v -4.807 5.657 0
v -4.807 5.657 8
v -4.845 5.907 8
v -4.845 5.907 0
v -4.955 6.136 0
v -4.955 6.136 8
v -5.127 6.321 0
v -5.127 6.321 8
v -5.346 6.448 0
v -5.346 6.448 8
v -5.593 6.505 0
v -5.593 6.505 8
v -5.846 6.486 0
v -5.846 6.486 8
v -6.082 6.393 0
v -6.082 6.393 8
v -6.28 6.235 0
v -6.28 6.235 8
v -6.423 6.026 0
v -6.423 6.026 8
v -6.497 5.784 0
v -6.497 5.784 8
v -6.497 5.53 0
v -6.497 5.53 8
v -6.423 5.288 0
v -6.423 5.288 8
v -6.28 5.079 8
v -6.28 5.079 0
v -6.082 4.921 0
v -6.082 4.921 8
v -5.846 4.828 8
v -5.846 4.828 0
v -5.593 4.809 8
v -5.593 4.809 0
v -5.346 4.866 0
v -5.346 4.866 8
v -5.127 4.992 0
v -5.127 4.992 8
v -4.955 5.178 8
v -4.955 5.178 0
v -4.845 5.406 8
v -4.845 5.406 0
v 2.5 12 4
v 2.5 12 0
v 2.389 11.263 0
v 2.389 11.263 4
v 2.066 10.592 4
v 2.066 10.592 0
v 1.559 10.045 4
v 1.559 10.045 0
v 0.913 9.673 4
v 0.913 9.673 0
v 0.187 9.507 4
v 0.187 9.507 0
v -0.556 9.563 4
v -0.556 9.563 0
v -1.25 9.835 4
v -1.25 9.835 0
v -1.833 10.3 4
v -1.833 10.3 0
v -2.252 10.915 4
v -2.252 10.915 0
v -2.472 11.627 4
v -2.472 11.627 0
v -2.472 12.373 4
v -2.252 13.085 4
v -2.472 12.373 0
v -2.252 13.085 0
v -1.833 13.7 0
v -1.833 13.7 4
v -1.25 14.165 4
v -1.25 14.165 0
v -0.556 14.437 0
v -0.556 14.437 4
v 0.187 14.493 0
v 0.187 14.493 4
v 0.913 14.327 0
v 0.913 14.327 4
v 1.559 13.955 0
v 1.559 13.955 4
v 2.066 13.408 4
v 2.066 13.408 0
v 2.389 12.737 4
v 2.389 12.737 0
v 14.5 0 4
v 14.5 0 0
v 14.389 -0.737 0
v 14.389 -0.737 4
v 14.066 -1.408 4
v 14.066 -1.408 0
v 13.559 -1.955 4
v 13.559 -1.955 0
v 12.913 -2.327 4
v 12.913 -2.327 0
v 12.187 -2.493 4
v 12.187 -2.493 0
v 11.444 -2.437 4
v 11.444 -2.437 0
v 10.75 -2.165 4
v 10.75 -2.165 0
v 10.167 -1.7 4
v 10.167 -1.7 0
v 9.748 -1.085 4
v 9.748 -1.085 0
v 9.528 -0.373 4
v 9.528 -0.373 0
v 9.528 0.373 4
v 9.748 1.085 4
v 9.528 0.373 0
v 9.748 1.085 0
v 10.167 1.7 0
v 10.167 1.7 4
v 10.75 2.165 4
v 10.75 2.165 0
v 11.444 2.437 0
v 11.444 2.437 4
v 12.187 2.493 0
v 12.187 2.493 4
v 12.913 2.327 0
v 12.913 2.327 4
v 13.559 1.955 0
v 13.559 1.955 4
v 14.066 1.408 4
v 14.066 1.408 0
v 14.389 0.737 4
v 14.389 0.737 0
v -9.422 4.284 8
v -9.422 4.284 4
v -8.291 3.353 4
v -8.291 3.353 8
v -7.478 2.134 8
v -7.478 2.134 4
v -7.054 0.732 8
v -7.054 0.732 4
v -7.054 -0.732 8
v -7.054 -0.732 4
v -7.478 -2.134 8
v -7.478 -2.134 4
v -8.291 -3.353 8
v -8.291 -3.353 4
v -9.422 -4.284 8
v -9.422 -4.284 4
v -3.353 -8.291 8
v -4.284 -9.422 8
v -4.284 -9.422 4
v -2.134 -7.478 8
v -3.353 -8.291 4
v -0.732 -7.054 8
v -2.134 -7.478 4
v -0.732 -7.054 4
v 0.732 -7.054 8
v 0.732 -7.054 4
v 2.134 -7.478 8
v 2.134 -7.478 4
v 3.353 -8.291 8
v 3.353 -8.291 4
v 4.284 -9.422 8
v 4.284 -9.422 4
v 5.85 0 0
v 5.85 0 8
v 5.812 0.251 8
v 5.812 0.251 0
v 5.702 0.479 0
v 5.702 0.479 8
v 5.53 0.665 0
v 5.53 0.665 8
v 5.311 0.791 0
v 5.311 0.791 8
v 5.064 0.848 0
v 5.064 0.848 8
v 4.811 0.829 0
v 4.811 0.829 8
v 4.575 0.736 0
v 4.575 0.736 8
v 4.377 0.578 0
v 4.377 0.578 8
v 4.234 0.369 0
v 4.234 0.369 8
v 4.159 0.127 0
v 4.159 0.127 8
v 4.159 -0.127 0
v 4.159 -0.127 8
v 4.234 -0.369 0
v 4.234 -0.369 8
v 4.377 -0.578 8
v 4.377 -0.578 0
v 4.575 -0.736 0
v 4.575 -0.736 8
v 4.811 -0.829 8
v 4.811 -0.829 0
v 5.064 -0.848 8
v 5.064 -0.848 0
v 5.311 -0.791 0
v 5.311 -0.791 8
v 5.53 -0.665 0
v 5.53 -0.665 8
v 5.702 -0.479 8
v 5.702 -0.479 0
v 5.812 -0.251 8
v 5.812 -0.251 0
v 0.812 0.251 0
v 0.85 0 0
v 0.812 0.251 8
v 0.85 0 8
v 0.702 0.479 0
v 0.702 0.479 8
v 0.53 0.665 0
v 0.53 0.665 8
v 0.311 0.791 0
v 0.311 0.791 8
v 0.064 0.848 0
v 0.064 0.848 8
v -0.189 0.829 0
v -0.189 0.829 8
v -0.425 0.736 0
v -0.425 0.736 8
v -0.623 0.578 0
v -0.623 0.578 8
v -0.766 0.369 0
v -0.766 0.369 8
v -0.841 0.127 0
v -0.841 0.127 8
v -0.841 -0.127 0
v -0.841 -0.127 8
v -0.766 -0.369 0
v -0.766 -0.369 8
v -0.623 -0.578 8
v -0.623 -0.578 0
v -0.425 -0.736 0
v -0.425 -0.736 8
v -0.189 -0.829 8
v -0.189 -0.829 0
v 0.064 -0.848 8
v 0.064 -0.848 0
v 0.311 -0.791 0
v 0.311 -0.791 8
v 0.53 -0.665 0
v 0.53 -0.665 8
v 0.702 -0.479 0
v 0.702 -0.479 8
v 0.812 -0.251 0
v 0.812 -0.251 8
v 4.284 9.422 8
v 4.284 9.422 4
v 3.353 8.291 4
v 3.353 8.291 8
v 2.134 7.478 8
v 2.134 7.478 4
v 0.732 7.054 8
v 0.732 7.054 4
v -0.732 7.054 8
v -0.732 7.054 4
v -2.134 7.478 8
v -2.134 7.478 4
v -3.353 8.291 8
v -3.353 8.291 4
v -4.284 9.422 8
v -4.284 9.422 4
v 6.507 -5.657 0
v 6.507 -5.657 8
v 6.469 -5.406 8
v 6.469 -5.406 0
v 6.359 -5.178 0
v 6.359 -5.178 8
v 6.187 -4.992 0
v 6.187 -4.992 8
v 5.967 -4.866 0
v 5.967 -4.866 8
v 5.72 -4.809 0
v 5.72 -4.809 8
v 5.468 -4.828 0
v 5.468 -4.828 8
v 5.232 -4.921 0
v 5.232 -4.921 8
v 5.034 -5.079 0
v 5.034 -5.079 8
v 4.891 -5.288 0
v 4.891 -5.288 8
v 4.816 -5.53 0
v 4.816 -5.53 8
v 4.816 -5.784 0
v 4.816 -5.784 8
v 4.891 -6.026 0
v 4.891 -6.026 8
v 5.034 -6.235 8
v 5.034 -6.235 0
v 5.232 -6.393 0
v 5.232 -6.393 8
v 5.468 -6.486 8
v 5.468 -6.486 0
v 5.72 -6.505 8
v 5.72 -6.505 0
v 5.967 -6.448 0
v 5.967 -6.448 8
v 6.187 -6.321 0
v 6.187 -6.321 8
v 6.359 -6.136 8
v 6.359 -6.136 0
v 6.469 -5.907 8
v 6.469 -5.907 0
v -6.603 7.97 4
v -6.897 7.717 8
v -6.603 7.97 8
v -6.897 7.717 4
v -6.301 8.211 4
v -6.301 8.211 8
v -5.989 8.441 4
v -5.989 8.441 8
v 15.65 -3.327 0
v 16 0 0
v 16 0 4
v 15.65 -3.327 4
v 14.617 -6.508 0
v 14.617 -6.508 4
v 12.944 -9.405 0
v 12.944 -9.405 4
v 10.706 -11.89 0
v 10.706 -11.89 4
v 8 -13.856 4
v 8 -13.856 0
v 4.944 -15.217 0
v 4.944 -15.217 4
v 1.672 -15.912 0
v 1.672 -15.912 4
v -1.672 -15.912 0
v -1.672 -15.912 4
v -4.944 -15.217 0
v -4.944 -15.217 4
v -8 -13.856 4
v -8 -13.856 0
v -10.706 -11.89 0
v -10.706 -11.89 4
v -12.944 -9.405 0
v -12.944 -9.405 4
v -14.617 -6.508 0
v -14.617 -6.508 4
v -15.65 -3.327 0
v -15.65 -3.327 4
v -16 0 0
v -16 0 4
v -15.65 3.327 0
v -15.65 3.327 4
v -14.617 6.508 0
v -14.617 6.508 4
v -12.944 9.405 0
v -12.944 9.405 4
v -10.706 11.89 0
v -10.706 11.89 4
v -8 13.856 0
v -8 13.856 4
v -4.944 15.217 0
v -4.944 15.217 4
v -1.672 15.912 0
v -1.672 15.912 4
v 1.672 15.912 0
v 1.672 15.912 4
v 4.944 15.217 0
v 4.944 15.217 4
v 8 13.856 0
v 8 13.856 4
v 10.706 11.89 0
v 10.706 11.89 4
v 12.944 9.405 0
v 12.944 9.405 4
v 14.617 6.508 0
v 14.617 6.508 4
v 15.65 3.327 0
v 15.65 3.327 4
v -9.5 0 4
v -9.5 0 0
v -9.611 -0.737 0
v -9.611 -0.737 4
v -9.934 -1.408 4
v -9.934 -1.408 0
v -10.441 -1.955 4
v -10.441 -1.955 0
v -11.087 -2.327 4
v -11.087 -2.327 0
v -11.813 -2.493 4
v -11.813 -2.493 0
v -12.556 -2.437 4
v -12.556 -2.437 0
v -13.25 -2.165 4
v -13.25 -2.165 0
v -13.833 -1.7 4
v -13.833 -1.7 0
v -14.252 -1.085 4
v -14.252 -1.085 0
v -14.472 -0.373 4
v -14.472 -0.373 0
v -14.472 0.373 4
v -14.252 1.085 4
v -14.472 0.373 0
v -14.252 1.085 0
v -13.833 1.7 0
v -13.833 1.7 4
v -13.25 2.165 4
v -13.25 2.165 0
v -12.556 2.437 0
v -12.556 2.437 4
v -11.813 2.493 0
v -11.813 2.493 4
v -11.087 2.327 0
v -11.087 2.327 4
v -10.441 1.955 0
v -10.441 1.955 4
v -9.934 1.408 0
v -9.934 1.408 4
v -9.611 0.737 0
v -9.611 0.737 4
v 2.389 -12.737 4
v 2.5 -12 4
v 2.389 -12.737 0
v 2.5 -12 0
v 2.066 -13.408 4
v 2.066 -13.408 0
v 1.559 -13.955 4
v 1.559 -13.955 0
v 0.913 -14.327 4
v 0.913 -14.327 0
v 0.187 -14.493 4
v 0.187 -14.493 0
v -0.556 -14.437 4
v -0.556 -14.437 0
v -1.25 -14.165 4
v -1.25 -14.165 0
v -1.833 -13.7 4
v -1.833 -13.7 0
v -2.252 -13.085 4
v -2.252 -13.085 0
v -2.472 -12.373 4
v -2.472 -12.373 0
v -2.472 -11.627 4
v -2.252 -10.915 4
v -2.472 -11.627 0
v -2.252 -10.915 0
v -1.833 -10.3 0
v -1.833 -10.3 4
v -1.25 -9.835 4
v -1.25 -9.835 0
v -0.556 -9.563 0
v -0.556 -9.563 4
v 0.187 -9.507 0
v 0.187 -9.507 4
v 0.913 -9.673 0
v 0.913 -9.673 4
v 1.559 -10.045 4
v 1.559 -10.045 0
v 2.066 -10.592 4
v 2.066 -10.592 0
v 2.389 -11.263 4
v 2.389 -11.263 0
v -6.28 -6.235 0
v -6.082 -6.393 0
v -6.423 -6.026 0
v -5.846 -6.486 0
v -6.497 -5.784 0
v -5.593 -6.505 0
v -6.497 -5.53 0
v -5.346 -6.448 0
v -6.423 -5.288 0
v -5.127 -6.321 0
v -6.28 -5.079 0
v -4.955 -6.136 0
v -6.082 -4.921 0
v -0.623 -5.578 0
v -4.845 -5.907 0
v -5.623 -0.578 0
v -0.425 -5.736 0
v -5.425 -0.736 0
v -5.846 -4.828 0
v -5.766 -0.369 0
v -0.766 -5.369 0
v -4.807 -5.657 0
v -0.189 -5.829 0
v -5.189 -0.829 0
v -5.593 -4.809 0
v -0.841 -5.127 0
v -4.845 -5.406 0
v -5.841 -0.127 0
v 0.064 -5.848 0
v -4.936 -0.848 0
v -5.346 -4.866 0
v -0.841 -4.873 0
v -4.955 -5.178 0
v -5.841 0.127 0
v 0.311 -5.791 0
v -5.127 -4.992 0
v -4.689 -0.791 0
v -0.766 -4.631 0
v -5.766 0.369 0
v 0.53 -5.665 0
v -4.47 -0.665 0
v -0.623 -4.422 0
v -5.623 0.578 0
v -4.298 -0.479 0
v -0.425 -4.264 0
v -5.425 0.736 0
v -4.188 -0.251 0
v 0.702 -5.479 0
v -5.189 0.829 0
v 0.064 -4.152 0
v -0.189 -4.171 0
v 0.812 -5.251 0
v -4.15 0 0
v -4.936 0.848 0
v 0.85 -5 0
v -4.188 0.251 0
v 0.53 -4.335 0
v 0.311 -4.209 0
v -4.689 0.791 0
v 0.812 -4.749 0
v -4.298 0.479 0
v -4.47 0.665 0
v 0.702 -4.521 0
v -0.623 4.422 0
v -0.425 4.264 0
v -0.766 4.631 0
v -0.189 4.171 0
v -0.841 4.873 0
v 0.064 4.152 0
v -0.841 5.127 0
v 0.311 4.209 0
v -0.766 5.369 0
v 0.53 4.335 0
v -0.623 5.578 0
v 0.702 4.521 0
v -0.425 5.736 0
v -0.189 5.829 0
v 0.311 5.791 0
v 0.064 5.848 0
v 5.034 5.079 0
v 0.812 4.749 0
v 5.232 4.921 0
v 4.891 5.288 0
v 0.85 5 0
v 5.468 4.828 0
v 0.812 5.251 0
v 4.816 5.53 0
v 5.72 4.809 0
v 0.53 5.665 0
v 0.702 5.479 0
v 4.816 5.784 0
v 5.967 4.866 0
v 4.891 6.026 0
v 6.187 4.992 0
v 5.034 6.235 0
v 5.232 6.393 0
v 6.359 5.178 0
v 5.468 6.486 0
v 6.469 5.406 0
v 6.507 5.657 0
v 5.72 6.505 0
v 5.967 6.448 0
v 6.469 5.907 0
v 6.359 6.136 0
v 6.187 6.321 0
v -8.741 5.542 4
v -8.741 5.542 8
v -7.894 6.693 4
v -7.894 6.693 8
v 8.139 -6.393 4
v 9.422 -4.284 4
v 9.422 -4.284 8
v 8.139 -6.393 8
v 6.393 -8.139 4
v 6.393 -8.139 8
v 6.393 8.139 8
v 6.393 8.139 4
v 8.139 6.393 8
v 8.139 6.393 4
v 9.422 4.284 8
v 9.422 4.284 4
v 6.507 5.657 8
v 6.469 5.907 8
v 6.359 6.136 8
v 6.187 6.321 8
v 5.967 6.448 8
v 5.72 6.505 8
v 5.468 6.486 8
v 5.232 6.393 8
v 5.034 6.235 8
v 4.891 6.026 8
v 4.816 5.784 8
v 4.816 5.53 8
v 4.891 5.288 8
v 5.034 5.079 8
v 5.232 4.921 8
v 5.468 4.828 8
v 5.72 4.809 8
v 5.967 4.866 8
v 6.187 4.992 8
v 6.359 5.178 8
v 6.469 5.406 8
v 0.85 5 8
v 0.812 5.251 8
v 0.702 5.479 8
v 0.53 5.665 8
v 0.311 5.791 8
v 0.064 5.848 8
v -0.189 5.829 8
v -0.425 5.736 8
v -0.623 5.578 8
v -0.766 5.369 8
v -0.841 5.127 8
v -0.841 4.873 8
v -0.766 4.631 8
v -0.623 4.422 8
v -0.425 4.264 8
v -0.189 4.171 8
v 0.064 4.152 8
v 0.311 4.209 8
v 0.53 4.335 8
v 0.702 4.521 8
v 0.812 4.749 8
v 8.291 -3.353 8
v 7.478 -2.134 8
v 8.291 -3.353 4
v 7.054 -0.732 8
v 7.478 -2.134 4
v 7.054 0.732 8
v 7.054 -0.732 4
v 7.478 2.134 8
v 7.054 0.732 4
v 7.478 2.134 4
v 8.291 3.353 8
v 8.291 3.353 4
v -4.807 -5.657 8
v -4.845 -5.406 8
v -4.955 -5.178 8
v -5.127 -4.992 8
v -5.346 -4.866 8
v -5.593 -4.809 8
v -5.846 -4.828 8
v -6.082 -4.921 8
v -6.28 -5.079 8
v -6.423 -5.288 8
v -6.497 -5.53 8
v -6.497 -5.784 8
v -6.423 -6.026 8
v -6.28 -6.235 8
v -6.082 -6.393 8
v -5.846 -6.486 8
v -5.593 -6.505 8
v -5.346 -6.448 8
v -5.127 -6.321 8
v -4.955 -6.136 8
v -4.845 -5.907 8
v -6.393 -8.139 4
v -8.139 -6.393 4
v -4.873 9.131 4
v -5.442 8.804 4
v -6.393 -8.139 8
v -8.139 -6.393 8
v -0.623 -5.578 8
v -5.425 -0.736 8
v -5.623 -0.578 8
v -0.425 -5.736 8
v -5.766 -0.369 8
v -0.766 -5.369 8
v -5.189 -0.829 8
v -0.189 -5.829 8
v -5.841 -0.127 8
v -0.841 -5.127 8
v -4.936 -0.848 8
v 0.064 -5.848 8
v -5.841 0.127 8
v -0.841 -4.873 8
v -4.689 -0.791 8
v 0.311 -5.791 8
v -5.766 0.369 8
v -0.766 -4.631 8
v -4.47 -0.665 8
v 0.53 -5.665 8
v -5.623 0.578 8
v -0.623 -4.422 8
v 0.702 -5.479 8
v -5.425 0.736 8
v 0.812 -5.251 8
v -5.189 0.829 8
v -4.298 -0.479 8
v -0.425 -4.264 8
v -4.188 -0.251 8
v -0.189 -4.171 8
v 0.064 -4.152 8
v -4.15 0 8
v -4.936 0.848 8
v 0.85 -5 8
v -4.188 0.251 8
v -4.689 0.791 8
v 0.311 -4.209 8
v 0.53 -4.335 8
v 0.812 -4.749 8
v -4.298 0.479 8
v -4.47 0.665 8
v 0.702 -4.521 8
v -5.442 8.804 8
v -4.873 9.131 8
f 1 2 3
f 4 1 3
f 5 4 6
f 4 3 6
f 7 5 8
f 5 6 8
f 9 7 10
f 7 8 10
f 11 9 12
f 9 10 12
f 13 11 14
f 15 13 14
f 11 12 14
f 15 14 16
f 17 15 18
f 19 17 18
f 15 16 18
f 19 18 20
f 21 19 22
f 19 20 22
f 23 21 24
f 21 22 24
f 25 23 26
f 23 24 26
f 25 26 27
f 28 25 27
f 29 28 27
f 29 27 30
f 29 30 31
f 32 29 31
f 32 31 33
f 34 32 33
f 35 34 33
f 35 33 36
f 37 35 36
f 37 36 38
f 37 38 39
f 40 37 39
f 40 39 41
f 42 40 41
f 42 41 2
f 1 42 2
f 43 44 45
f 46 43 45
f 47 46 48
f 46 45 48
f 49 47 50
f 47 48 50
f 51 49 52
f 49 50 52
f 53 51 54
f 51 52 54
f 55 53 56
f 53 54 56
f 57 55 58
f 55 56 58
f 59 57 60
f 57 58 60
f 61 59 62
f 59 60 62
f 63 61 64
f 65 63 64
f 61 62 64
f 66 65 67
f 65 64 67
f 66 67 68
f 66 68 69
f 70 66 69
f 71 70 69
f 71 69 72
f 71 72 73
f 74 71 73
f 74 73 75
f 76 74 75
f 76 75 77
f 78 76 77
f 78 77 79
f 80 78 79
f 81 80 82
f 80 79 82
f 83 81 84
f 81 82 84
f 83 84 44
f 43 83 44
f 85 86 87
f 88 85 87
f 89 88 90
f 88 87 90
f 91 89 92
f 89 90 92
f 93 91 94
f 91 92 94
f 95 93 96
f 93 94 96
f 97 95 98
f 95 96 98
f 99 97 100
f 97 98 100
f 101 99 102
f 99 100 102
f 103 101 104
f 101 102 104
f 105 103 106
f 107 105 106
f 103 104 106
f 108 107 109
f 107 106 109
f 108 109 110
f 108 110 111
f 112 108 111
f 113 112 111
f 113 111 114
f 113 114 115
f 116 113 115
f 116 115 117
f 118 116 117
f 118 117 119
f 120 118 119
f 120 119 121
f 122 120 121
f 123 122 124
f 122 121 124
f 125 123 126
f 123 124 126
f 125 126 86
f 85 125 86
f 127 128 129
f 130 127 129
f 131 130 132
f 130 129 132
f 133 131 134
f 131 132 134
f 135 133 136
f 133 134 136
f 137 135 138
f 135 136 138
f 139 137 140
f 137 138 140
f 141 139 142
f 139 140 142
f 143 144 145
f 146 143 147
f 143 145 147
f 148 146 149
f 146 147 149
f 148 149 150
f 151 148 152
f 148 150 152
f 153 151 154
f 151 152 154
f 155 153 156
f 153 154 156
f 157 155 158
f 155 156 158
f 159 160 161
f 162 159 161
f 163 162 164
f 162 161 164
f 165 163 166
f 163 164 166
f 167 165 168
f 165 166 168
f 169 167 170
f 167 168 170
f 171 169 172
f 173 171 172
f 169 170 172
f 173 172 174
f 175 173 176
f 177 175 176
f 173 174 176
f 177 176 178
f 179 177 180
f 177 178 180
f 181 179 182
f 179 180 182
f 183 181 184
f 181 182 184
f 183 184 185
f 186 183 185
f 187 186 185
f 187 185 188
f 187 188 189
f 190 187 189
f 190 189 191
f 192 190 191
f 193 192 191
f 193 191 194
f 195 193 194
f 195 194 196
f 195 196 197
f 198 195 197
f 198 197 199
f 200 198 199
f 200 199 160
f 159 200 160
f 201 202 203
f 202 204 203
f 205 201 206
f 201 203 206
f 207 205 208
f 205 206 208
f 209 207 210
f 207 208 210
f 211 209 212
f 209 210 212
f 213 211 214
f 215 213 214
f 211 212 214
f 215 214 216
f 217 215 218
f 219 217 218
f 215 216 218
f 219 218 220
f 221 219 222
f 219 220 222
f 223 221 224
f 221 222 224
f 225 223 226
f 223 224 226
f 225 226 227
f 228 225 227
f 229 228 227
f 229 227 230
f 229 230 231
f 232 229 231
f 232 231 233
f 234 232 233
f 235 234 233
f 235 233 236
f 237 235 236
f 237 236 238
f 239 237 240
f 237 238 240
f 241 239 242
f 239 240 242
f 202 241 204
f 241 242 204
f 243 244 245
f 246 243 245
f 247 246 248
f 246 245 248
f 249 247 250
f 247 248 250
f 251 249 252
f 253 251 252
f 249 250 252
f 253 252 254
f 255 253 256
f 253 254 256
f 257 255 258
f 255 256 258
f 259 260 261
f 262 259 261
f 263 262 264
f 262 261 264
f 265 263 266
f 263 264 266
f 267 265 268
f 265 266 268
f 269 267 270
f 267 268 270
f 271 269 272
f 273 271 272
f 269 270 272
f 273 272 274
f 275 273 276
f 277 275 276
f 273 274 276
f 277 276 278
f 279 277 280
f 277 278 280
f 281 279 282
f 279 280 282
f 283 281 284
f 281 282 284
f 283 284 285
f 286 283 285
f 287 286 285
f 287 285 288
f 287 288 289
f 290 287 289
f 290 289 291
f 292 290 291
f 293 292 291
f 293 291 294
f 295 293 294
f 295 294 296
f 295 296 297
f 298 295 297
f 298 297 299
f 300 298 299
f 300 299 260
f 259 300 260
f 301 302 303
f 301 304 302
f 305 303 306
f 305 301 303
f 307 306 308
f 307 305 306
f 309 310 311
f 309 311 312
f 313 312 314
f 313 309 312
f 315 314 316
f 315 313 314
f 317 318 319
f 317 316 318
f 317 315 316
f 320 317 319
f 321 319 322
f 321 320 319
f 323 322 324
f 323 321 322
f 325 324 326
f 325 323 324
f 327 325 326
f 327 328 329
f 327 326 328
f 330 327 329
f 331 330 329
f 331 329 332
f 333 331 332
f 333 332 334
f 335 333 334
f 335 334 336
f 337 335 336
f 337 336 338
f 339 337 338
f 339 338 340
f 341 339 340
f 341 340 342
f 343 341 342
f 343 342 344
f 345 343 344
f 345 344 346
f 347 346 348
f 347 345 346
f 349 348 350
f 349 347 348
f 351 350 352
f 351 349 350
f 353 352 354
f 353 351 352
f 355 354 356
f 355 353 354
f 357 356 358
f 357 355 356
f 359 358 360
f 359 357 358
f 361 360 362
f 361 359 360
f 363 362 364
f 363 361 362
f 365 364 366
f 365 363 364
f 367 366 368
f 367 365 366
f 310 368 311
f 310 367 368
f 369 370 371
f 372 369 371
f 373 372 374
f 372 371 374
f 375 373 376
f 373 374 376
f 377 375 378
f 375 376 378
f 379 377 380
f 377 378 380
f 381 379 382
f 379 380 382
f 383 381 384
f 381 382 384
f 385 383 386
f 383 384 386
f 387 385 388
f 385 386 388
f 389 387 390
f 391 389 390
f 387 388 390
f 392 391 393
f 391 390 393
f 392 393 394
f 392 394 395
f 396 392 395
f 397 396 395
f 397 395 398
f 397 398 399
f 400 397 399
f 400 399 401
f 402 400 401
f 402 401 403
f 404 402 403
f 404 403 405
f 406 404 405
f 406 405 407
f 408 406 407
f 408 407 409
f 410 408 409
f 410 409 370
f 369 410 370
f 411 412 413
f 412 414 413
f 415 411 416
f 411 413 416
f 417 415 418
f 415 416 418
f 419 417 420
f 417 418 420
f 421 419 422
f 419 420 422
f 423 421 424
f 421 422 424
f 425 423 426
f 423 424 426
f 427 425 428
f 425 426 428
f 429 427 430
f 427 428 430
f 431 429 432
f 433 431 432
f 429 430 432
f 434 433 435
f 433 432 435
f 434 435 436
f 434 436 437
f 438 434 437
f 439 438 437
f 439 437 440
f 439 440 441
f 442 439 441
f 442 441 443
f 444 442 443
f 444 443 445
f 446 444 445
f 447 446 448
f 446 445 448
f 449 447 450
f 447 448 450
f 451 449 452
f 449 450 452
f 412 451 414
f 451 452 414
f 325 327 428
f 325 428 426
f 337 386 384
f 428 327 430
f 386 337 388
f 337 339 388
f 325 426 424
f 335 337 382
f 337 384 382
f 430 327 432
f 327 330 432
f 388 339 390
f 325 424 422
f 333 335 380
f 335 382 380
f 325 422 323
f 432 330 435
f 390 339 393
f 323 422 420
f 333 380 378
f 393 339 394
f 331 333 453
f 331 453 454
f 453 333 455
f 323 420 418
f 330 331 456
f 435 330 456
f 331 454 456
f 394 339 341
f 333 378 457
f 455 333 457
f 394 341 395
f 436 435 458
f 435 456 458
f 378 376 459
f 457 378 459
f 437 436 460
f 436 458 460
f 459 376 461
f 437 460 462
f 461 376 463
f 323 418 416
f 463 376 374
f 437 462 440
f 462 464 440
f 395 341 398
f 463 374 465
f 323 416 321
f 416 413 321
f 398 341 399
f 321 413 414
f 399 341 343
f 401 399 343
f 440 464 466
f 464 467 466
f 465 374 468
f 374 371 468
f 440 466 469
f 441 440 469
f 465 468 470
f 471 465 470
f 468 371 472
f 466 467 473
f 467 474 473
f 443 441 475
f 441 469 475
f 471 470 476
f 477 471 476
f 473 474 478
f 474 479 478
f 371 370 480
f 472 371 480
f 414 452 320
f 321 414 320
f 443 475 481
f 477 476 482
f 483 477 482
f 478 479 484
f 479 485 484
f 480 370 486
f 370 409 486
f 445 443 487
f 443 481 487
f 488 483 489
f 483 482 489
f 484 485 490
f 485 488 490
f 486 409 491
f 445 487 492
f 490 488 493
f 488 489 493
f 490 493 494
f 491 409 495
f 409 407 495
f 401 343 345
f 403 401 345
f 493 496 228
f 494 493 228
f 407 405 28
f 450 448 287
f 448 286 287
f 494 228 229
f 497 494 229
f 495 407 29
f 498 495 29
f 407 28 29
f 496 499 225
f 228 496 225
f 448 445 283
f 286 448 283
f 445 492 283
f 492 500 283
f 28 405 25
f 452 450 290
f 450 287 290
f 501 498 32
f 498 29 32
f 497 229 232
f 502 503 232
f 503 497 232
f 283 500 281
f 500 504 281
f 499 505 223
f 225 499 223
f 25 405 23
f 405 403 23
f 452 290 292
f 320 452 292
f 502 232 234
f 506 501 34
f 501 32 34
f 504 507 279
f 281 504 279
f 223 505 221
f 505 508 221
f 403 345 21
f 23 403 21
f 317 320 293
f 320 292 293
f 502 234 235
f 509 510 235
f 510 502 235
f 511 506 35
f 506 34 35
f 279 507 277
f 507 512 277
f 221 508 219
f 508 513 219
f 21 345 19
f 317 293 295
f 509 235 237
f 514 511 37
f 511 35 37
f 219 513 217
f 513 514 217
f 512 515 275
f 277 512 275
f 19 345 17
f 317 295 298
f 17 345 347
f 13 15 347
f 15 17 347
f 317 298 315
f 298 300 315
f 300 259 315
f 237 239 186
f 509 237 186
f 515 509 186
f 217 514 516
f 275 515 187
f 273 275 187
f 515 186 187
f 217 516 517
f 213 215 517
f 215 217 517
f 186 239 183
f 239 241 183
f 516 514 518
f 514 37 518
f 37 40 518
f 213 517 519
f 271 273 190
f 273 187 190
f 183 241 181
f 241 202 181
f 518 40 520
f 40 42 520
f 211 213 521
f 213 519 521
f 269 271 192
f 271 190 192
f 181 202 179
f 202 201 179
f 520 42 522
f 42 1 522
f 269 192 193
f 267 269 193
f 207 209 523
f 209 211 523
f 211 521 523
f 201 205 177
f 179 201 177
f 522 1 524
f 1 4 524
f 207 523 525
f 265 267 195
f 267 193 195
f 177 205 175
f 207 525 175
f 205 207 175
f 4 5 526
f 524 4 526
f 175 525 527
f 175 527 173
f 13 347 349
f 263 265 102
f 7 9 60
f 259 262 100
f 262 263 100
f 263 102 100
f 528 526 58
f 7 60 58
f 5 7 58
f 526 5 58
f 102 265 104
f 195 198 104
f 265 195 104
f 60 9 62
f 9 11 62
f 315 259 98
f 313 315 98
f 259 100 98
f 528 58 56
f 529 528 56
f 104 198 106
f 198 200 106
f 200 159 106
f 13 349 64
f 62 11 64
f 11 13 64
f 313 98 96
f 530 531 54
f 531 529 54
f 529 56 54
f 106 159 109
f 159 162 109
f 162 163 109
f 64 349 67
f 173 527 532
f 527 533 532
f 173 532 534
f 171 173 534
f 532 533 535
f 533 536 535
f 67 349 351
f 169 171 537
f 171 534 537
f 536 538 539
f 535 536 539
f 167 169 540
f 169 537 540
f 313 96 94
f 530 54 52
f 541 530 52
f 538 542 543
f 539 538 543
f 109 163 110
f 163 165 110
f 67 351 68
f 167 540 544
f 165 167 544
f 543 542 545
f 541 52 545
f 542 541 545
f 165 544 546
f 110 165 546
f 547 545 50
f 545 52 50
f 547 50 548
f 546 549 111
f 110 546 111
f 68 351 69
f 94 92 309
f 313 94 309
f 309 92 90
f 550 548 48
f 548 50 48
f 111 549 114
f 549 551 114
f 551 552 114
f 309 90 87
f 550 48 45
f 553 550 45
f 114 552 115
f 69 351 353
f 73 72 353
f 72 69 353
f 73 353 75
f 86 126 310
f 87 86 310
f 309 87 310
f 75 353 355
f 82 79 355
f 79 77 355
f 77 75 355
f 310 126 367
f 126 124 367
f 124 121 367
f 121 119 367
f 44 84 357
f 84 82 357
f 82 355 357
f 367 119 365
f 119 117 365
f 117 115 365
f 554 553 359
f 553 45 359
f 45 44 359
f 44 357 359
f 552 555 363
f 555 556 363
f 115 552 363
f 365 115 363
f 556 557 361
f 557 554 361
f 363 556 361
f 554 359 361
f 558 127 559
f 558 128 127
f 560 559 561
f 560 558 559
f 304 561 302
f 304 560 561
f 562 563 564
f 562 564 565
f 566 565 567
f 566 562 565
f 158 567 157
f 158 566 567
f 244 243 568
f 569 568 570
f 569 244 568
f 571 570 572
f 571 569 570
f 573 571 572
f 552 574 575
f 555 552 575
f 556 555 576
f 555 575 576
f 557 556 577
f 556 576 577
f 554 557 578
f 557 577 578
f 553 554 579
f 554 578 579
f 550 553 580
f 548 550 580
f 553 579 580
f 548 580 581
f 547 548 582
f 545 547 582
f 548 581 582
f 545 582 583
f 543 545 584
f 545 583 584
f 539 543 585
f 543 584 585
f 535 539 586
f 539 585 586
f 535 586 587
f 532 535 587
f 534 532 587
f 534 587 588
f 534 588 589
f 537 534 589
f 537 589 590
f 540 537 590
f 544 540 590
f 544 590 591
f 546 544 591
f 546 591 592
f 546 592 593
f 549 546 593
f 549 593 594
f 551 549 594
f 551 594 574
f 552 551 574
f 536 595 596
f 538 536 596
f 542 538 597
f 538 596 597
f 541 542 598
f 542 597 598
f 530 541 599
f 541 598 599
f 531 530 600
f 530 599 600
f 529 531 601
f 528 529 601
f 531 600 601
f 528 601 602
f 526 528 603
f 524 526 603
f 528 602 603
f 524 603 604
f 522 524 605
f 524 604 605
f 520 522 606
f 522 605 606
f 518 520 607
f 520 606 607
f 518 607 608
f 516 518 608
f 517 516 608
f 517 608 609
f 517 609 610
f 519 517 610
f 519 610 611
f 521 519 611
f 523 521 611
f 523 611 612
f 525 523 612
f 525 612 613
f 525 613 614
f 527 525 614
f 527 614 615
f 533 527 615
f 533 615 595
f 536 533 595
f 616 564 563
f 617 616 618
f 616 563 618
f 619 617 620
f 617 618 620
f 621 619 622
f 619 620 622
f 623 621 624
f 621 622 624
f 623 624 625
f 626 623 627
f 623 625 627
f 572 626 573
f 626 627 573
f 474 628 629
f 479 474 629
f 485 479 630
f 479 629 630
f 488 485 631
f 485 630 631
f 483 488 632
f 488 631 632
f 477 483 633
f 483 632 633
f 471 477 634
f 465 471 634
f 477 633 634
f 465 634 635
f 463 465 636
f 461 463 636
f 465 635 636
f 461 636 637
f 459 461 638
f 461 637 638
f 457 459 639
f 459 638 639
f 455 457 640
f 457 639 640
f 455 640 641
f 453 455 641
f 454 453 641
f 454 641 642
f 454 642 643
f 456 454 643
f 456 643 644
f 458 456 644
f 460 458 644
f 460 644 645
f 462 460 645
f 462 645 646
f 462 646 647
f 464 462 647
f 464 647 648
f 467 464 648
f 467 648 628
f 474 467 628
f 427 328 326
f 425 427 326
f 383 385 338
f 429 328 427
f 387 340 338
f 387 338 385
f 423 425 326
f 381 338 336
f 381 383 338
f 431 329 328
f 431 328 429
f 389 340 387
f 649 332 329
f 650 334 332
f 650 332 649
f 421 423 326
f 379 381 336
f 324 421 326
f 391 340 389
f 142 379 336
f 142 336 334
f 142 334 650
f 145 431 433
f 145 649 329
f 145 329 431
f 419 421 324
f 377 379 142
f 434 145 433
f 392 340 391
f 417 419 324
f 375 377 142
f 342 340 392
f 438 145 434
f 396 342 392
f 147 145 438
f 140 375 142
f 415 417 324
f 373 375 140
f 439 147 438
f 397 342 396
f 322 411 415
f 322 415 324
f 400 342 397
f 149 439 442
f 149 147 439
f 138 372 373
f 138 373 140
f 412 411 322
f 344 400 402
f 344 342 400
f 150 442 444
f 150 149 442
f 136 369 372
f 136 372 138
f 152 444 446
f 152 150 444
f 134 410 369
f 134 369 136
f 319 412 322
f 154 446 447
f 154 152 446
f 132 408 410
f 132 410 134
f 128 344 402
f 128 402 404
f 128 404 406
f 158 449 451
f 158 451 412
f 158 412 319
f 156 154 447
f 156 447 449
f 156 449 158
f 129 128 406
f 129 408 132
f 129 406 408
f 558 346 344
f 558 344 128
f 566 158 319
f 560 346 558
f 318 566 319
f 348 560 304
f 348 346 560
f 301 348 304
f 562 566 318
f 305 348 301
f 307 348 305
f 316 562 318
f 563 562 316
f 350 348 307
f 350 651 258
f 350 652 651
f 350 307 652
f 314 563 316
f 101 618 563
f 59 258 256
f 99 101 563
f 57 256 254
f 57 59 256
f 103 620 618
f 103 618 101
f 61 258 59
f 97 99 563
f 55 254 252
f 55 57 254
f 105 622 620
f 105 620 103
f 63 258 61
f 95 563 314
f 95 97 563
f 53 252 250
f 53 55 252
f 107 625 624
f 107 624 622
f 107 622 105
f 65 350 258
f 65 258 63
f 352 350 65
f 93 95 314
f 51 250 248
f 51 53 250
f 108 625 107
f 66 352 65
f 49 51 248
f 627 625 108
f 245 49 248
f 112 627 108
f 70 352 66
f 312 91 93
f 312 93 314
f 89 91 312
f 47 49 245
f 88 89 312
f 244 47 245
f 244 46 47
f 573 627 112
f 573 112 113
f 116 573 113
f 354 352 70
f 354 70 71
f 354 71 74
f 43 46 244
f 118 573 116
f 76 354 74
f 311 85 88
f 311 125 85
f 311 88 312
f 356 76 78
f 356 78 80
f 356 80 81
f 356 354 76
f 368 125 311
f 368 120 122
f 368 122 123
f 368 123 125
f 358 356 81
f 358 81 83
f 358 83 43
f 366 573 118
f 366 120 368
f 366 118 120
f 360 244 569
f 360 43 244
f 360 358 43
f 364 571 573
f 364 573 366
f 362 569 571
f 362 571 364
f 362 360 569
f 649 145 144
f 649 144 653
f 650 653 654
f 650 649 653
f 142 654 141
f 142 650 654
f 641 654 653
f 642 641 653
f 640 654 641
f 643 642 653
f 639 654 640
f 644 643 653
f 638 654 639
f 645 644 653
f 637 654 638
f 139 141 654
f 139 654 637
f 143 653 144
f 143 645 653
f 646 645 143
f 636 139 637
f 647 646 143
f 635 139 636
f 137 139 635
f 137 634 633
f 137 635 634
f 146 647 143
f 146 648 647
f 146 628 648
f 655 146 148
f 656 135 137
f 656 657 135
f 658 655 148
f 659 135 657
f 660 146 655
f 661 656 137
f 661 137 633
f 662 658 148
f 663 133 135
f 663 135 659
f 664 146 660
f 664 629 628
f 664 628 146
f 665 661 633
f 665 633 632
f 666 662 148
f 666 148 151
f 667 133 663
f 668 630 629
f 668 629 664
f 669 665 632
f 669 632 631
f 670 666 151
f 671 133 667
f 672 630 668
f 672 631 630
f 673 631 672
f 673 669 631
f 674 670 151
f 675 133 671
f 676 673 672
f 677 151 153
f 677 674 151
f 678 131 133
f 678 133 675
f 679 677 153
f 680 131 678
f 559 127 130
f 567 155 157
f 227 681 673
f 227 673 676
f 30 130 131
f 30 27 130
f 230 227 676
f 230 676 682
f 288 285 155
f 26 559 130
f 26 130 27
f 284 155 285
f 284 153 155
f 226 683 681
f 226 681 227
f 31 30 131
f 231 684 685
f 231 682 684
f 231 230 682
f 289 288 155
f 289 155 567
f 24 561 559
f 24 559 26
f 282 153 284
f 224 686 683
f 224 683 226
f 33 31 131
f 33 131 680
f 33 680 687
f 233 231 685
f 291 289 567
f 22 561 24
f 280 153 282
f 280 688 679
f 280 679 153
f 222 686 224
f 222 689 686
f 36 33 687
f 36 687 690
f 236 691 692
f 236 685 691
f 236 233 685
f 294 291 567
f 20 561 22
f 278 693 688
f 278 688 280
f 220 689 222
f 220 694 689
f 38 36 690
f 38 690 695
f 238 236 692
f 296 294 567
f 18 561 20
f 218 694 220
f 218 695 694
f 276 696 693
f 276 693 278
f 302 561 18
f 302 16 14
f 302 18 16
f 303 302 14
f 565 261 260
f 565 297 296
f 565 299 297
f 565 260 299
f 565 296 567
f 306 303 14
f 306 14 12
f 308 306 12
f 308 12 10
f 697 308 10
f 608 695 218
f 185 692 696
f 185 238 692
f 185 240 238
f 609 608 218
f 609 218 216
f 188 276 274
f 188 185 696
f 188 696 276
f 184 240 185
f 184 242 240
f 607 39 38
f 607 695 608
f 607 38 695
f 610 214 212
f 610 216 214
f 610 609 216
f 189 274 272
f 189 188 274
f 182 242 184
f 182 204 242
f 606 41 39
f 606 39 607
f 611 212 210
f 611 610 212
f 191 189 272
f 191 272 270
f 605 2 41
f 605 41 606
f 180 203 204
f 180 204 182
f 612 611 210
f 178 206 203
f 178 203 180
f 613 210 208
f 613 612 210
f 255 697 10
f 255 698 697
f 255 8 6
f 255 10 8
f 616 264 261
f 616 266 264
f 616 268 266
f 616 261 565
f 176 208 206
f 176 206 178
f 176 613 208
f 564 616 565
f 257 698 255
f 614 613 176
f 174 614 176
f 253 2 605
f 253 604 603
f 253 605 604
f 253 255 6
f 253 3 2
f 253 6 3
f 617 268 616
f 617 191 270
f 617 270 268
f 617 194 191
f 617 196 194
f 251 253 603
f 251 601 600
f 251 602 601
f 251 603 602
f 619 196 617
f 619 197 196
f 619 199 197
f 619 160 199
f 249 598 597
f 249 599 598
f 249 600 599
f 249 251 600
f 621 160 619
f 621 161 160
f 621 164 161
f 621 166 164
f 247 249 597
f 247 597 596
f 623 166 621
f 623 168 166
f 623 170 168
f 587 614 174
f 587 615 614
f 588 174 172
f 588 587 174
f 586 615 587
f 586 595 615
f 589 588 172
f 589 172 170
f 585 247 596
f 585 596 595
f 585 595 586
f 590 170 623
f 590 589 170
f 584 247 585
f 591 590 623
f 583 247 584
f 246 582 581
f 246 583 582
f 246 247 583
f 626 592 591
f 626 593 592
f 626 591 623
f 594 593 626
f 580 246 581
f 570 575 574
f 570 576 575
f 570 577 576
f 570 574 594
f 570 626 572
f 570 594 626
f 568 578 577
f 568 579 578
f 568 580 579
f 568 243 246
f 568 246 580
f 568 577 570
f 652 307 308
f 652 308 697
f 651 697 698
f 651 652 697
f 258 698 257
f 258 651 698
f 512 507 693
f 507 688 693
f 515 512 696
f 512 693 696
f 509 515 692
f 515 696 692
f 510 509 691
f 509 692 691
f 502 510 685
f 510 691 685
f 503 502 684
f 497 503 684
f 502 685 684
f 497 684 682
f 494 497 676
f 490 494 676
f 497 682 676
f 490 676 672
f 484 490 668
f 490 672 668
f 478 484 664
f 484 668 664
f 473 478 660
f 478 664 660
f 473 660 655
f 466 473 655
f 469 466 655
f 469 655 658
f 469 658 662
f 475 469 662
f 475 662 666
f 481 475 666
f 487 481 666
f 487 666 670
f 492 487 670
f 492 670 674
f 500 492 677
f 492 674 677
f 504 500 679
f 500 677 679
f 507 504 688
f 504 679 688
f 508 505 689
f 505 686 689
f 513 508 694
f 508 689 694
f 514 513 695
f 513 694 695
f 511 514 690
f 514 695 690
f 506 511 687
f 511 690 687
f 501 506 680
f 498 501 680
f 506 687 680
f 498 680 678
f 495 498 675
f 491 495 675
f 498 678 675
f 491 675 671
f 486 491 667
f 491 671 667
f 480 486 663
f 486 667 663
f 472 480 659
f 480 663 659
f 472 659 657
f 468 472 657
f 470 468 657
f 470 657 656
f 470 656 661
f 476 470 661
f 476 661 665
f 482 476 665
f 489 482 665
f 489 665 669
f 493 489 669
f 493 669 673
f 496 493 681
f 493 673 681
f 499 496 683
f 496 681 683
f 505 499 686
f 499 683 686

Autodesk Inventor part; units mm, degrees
ref_plane "YZ Plane" through (0, 0, 0) normal (1, 0, 0) x (0, 1, 0)
ref_plane "XZ Plane" through (0, 0, 0) normal (0, 1, 0) x (-1, 0, 0)
ref_plane "XY Plane" through (0, 0, 0) normal (0, 0, 1) x (1, 0, 0)
sketch "Sketch1" plane through (0, 0, 0) normal (0, 0, 1) x (1, 0, 0)
  circle A0 centre (0, 0) radius 16
  circle A1 centre (0, 0) radius 4
  circle A2 centre (12, 0) radius 2.5
  circle A3 centre (0, 12) radius 2.5
  circle A4 centre (-12, 0) radius 2.5
  circle A5 centre (0, -12) radius 2.5
  dimension "d0" = 32
  dimension "d1" = 8
  dimension "d2" = 5
  dimension "d3" = 12
  dimension "d6" = 360
extrude "Extrusion1" add sketch "Sketch1" along normal blind 4 contours A0 | A1
sketch "Sketch3" plane through (0, 0, 4) normal (0, 0, 1) x (1, 0, 0)
  arc A0 (-6.9584, 12.5904) -> (-5.9892, 8.4411) centre (5.202, 13.243) ccw
  arc A1 (-5.9892, 8.4411) -> (-6.8967, 7.7174) centre (0, 0) ccw
  arc A2 (-6.8967, 7.7174) -> (-10.7263, 9.5856) centre (-14.0685, -2.1247) ccw
  arc A3 (-10.7263, 9.5856) -> (-11.7321, 8.3244) centre (0, 0) ccw
  arc A4 (-11.7321, 8.3244) -> (-9.0586, 5.0065) centre (-1.0591, 14.1885) ccw
  arc A5 (-9.0586, 5.0065) -> (-9.5622, 3.9608) centre (0, 0) ccw
  arc A6 (-9.5622, 3.9608) -> (-13.8231, 3.9824) centre (-11.7534, -8.0184) ccw
  arc A7 (-13.8231, 3.9824) -> (-14.1821, 2.4096) centre (0, 0) ccw
  arc A8 (-14.1821, 2.4096) -> (-10.3337, 0.5803) centre (-7.1104, 12.3239) ccw
  arc A9 (-10.3337, 0.5803) -> (-10.3337, -0.5803) centre (0, 0) ccw
  arc A10 (-10.3337, -0.5803) -> (-14.1821, -2.4096) centre (-7.1104, -12.3239) ccw
  arc A11 (-14.1821, -2.4096) -> (-13.8231, -3.9824) centre (0, 0) ccw
  arc A12 (-13.8231, -3.9824) -> (-9.5622, -3.9608) centre (-11.7534, 8.0184) ccw
  arc A13 (-9.5622, -3.9608) -> (-9.0586, -5.0065) centre (0, 0) ccw
  arc A14 (-9.0586, -5.0065) -> (-11.7321, -8.3244) centre (-1.0591, -14.1885) ccw
  arc A15 (-11.7321, -8.3244) -> (-10.7263, -9.5856) centre (0, 0) ccw
  arc A16 (-10.7263, -9.5856) -> (-6.8967, -7.7174) centre (-14.0685, 2.1247) ccw
  arc A17 (-6.8967, -7.7174) -> (-5.9892, -8.4411) centre (0, 0) ccw
  arc A18 (-5.9892, -8.4411) -> (-6.9584, -12.5904) centre (5.202, -13.243) ccw
  arc A19 (-6.9584, -12.5904) -> (-5.505, -13.2903) centre (0, 0) ccw
  arc A20 (-5.505, -13.2903) -> (-2.8652, -9.9455) centre (-13.5971, -4.1898) ccw
  arc A21 (-2.8652, -9.9455) -> (-1.7337, -10.2038) centre (0, 0) ccw
  arc A22 (-1.7337, -10.2038) -> (-0.8066, -14.3627) centre (10.4327, -9.6744) ccw
  arc A23 (-0.8066, -14.3627) -> (0.8066, -14.3627) centre (0, 0) ccw
  arc A24 (0.8066, -14.3627) -> (1.7337, -10.2038) centre (-10.4327, -9.6744) ccw
  arc A25 (1.7337, -10.2038) -> (2.8652, -9.9455) centre (0, 0) ccw
  arc A26 (2.8652, -9.9455) -> (5.505, -13.2903) centre (13.5971, -4.1898) ccw
  arc A27 (5.505, -13.2903) -> (6.9584, -12.5904) centre (0, 0) ccw
  arc A28 (6.9584, -12.5904) -> (5.9892, -8.4411) centre (-5.202, -13.243) ccw
  arc A29 (5.9892, -8.4411) -> (6.8967, -7.7174) centre (0, 0) ccw
  arc A30 (6.8967, -7.7174) -> (10.7263, -9.5856) centre (14.0685, 2.1247) ccw
  arc A31 (10.7263, -9.5856) -> (11.7321, -8.3244) centre (0, 0) ccw
  arc A32 (11.7321, -8.3244) -> (9.0586, -5.0065) centre (1.0591, -14.1885) ccw
  arc A33 (9.0586, -5.0065) -> (9.5622, -3.9608) centre (0, 0) ccw
  arc A34 (9.5622, -3.9608) -> (13.8231, -3.9824) centre (11.7534, 8.0184) ccw
  arc A35 (13.8231, -3.9824) -> (14.1821, -2.4096) centre (0, 0) ccw
  arc A36 (14.1821, -2.4096) -> (10.3337, -0.5803) centre (7.1104, -12.3239) ccw
  arc A37 (10.3337, -0.5803) -> (10.3337, 0.5803) centre (0, 0) ccw
  arc A38 (10.3337, 0.5803) -> (14.1821, 2.4096) centre (7.1104, 12.3239) ccw
  arc A39 (14.1821, 2.4096) -> (13.8231, 3.9824) centre (0, 0) ccw
  arc A40 (13.8231, 3.9824) -> (9.5622, 3.9608) centre (11.7534, -8.0184) ccw
  arc A41 (9.5622, 3.9608) -> (9.0586, 5.0065) centre (0, 0) ccw
  arc A42 (9.0586, 5.0065) -> (11.7321, 8.3244) centre (1.0591, 14.1885) ccw
  arc A43 (11.7321, 8.3244) -> (10.7263, 9.5856) centre (0, 0) ccw
  arc A44 (10.7263, 9.5856) -> (6.8967, 7.7174) centre (14.0685, -2.1247) ccw
  arc A45 (6.8967, 7.7174) -> (5.9892, 8.4411) centre (0, 0) ccw
  arc A46 (5.9892, 8.4411) -> (6.9584, 12.5904) centre (-5.202, 13.243) ccw
  arc A47 (6.9584, 12.5904) -> (5.505, 13.2903) centre (0, 0) ccw
  arc A48 (5.505, 13.2903) -> (2.8652, 9.9455) centre (13.5971, 4.1898) ccw
  arc A49 (2.8652, 9.9455) -> (1.7337, 10.2038) centre (0, 0) ccw
  arc A50 (1.7337, 10.2038) -> (0.8066, 14.3627) centre (-10.4327, 9.6744) ccw
  arc A51 (0.8066, 14.3627) -> (-0.8066, 14.3627) centre (0, 0) ccw
  arc A52 (-0.8066, 14.3627) -> (-1.7337, 10.2038) centre (10.4327, 9.6744) ccw
  arc A53 (-1.7337, 10.2038) -> (-2.8652, 9.9455) centre (0, 0) ccw
  arc A54 (-2.8652, 9.9455) -> (-5.505, 13.2903) centre (-13.5971, 4.1898) ccw
  arc A55 (-5.505, 13.2903) -> (-6.9584, 12.5904) centre (0, 0) ccw
extrude "Extrusion3" add sketch "Sketch3" along normal blind 4
sketch "Sketch2" plane through (0, 0, 4) normal (0, 0, 1) x (1, 0, 0)
  circle A0 centre (12, 0) radius 2.5
  arc A1 (-1.7381, -10.203) -> (1.7381, -10.203) centre (0, -12) ccw
  arc A2 (1.7381, 10.203) -> (-1.7381, 10.203) centre (0, 12) ccw
  arc A3 (13.5312, -1.9762) -> (13.5312, 1.9762) centre (12, 0) ccw
  circle A4 centre (0, 0) radius 16 construction
  circle A5 centre (12, 0) radius 4.5
  circle A6 centre (0, 12) radius 4.5
  circle A7 centre (-12, 0) radius 4.5
  circle A8 centre (0, -12) radius 4.5
  arc A9 (14.1821, -2.4096) -> (13.5312, -1.9762) centre (7.1104, -12.3239) ccw
  arc A10 (13.8231, -3.9824) -> (14.1821, -2.4096) centre (0, 0) ccw
  arc A11 (9.5622, -3.9608) -> (13.8231, -3.9824) centre (11.7534, 8.0184) ccw
  arc A12 (9.0586, -5.0065) -> (9.5622, -3.9608) centre (0, 0) ccw
  arc A13 (11.7321, -8.3244) -> (9.0586, -5.0065) centre (1.0591, -14.1885) ccw
  arc A14 (10.7263, -9.5856) -> (11.7321, -8.3244) centre (0, 0) ccw
  arc A15 (6.8967, -7.7174) -> (10.7263, -9.5856) centre (14.0685, 2.1247) ccw
  arc A16 (5.9892, -8.4411) -> (6.8967, -7.7174) centre (0, 0) ccw
  arc A17 (6.9584, -12.5904) -> (5.9892, -8.4411) centre (-5.202, -13.243) ccw
  arc A18 (5.505, -13.2903) -> (6.9584, -12.5904) centre (0, 0) ccw
  arc A19 (2.8652, -9.9455) -> (5.505, -13.2903) centre (13.5971, -4.1898) ccw
  arc A20 (1.7381, -10.203) -> (2.8652, -9.9455) centre (0, 0) ccw
  arc A21 (-2.8652, -9.9455) -> (-1.7381, -10.203) centre (0, 0) ccw
  arc A22 (-5.505, -13.2903) -> (-2.8652, -9.9455) centre (-13.5971, -4.1898) ccw
  arc A23 (-6.9584, -12.5904) -> (-5.505, -13.2903) centre (0, 0) ccw
  arc A24 (-5.9892, -8.4411) -> (-6.9584, -12.5904) centre (5.202, -13.243) ccw
  arc A25 (-6.8967, -7.7174) -> (-5.9892, -8.4411) centre (0, 0) ccw
  arc A26 (-10.7263, -9.5856) -> (-6.8967, -7.7174) centre (-14.0685, 2.1247) ccw
  arc A27 (-11.7321, -8.3244) -> (-10.7263, -9.5856) centre (0, 0) ccw
  arc A28 (-9.0586, -5.0065) -> (-11.7321, -8.3244) centre (-1.0591, -14.1885) ccw
  arc A29 (-9.5622, -3.9608) -> (-9.0586, -5.0065) centre (0, 0) ccw
  arc A30 (-13.8231, -3.9824) -> (-9.5622, -3.9608) centre (-11.7534, 8.0184) ccw
  arc A31 (-14.1821, -2.4096) -> (-13.8231, -3.9824) centre (0, 0) ccw
  arc A32 (-13.5312, -1.9762) -> (-14.1821, -2.4096) centre (-7.1104, -12.3239) ccw
  arc A33 (-13.5312, 1.9762) -> (-13.5312, -1.9762) centre (-12, 0) ccw
  arc A34 (-14.1821, 2.4096) -> (-13.5312, 1.9762) centre (-7.1104, 12.3239) ccw
  arc A35 (-13.8231, 3.9824) -> (-14.1821, 2.4096) centre (0, 0) ccw
  arc A36 (-9.5622, 3.9608) -> (-13.8231, 3.9824) centre (-11.7534, -8.0184) ccw
  arc A37 (-9.0586, 5.0065) -> (-9.5622, 3.9608) centre (0, 0) ccw
  arc A38 (-11.7321, 8.3244) -> (-9.0586, 5.0065) centre (-1.0591, 14.1885) ccw
  arc A39 (-10.7263, 9.5856) -> (-11.7321, 8.3244) centre (0, 0) ccw
  arc A40 (-6.8967, 7.7174) -> (-10.7263, 9.5856) centre (-14.0685, -2.1247) ccw
  arc A41 (-5.9892, 8.4411) -> (-6.8967, 7.7174) centre (0, 0) ccw
  arc A42 (-6.9584, 12.5904) -> (-5.9892, 8.4411) centre (5.202, 13.243) ccw
  arc A43 (-5.505, 13.2903) -> (-6.9584, 12.5904) centre (0, 0) ccw
  arc A44 (-2.8652, 9.9455) -> (-5.505, 13.2903) centre (-13.5971, 4.1898) ccw
  arc A45 (-1.7381, 10.203) -> (-2.8652, 9.9455) centre (0, 0) ccw
  arc A46 (2.8652, 9.9455) -> (1.7381, 10.203) centre (0, 0) ccw
  arc A47 (5.505, 13.2903) -> (2.8652, 9.9455) centre (13.5971, 4.1898) ccw
  arc A48 (6.9584, 12.5904) -> (5.505, 13.2903) centre (0, 0) ccw
  arc A49 (5.9892, 8.4411) -> (6.9584, 12.5904) centre (-5.202, 13.243) ccw
  arc A50 (6.8967, 7.7174) -> (5.9892, 8.4411) centre (0, 0) ccw
  arc A51 (10.7263, 9.5856) -> (6.8967, 7.7174) centre (14.0685, -2.1247) ccw
  arc A52 (11.7321, 8.3244) -> (10.7263, 9.5856) centre (0, 0) ccw
  arc A53 (9.0586, 5.0065) -> (11.7321, 8.3244) centre (1.0591, 14.1885) ccw
  arc A54 (9.5622, 3.9608) -> (9.0586, 5.0065) centre (0, 0) ccw
  arc A55 (13.8231, 3.9824) -> (9.5622, 3.9608) centre (11.7534, -8.0184) ccw
  arc A56 (14.1821, 2.4096) -> (13.8231, 3.9824) centre (0, 0) ccw
  arc A57 (13.5312, 1.9762) -> (14.1821, 2.4096) centre (7.1104, 12.3239) ccw
  dimension "d10" = 9
  dimension "d13" = 360
extrude "Extrusion4" cut sketch "Sketch2" along normal blind 4 contours A0 | A0 A57 A56 A55 A5 A11 A10 A9 | A0 A9 A10 A11 A5 A55 A56 A57 | A47 A46 A2 A45 A44 A6 | A6 A44 A45 A2 A46 A47 | A19 A20 A1 A21 A22 A8 | A8 A22 A21 A1 A20 A19 | A36 A35 A34 A33 A32 A31 A30 A7 | A7 A30 A31 A32 A33 A34 A35 A36
sketch "Sketch4" plane through (0, 0, 8) normal (0, 0, 1) x (1, 0, 0)
  circle A0 centre (5, 0) radius 0.85
  circle A1 centre (0, 5) radius 0.85
  circle A2 centre (-5, 0) radius 0.85
  circle A3 centre (0, -5) radius 0.85
  circle A4 centre (5.6569, 5.6569) radius 0.85
  line L0 (0, 0) -> (5.6569, 5.6569) construction
  line L1 (0, 0) -> (5, 0) construction
  circle A5 centre (-5.6569, 5.6569) radius 0.85
  circle A6 centre (-5.6569, -5.6569) radius 0.85
  circle A7 centre (5.6569, -5.6569) radius 0.85
  circle A8 centre (0, 0) radius 0.85
  dimension "d21" = 1.7
  dimension "d22" = 5
  dimension "d25" = 360
  dimension "d27" = 1.7
  dimension "d28" = 45
  dimension "d29" = 8
  dimension "d32" = 360
  dimension "d34" = 1.7
extrude "Extrusion5" cut sketch "Sketch4" against normal through all
sketch "Sketch5" plane through (0, 0, 4) normal (0, 0, 1) x (1, 0, 0)
  circle A0 centre (0, 0) radius 0.85 projected
  arc A1 (-5.9892, 8.4411) -> (-6.8967, 7.7174) centre (0, 0) ccw projected
  circle A2 centre (0, 0) radius 10.35
  circle A3 centre (0, 0) radius 16 projected
extrude "Extrusion6" cut sketch "Sketch5" along normal through all contours A3
sketch "Sketch6" plane through (0, 0, 4) normal (0, 0, 1) x (1, 0, 0)
  circle A0 centre (12, 0) radius 2.5 projected
  circle A1 centre (12, 0) radius 5
  circle A2 centre (0, 12) radius 5
  circle A3 centre (-12, 0) radius 5
  circle A4 centre (0, -12) radius 5
  point P0 (0, 0)
  dimension "d39" = 10
  dimension "d42" = 360
extrude "Extrusion7" cut sketch "Sketch6" along normal through all contours A0 | A1 | A2 | A3 | A4
properties part number "AC08" material "ABS Plastic"
